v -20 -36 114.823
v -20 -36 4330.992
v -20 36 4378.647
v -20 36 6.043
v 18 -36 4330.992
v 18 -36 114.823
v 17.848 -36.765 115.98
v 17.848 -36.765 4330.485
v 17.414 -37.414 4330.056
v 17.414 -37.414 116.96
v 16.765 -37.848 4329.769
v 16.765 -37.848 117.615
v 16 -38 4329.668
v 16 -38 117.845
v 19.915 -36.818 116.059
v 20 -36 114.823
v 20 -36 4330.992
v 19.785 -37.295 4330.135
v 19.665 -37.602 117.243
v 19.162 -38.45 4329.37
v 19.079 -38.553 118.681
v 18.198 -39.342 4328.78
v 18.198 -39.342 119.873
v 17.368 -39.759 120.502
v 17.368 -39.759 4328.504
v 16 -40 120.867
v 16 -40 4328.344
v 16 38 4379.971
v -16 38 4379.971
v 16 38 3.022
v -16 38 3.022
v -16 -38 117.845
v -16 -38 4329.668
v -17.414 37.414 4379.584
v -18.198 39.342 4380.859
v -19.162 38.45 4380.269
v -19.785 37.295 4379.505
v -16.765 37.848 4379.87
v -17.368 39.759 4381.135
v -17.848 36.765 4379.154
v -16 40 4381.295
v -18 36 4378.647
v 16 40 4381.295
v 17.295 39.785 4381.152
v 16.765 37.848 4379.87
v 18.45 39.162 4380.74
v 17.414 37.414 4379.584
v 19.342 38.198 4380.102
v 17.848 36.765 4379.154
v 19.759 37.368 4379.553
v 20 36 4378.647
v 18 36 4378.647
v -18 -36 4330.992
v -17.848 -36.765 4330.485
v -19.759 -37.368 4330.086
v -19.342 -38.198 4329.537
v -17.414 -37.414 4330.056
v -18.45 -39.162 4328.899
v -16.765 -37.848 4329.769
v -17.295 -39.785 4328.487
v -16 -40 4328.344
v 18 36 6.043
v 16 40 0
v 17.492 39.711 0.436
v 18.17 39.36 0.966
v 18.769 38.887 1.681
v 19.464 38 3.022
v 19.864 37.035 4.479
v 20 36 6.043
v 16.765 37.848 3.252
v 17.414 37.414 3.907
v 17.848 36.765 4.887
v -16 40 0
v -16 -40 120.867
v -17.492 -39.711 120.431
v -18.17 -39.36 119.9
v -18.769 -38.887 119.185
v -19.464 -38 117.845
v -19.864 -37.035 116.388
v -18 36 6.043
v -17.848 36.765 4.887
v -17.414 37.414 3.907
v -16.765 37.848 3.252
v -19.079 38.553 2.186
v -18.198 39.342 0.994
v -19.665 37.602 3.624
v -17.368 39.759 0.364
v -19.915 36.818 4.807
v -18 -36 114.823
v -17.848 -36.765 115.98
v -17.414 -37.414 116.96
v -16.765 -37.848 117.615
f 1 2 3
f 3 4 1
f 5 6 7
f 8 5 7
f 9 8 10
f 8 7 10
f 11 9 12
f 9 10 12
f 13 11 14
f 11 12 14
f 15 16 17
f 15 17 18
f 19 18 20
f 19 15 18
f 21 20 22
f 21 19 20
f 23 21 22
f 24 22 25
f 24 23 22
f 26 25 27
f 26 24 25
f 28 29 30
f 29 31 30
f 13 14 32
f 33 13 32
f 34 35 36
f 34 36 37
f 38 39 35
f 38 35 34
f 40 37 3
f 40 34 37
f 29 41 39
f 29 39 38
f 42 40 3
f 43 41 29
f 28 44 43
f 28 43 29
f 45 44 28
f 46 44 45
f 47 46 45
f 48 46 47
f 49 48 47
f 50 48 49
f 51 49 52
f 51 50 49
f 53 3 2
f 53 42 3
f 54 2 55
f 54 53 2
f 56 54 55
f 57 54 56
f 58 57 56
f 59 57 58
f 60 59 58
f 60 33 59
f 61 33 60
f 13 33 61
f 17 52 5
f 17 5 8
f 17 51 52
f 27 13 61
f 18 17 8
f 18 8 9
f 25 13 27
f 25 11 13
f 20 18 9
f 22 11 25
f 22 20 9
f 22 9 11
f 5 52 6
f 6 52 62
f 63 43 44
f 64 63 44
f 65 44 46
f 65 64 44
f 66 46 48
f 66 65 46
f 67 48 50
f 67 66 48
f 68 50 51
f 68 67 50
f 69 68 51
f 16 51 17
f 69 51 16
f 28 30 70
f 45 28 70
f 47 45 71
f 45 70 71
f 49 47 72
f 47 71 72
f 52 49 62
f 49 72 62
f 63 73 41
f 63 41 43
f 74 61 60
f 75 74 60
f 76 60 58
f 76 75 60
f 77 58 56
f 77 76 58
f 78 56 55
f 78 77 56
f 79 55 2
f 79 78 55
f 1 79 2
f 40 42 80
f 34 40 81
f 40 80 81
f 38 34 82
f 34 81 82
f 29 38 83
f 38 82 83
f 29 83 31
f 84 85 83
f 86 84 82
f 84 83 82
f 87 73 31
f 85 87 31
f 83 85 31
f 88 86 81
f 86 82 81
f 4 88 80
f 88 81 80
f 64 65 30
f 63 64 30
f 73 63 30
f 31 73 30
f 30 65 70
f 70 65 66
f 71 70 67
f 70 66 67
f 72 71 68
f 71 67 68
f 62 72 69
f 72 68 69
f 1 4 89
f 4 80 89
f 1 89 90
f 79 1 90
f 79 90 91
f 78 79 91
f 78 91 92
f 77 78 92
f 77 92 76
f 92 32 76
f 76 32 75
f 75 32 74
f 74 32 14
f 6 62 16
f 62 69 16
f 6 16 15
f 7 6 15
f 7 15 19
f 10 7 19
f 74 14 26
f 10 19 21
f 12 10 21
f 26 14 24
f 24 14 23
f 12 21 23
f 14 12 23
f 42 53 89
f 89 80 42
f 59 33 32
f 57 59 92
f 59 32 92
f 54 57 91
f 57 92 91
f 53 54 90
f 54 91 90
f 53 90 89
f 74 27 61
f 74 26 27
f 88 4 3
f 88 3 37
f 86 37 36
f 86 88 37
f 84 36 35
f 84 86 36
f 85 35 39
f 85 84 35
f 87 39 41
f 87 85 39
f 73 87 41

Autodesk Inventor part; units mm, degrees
ref_plane "YZ Plane" through (0, 0, 0) normal (1, 0, 0) x (0, 1, 0)
ref_plane "Start plane" through (0, 0, 0) normal (0, 0, 1) x (1, 0, 0)
ref_plane "End plane" through (0, 0, 4381.295) normal (0, 0, 1) x (1, 0, 0)
sketch "Sketch" plane through (0, 0, 0) normal (0, 0, 1) x (1, 0, 0)
  line L0 (-20, -36) -> (-20, 36)
  line L1 (-16, 40) -> (16, 40)
  line L2 (20, 36) -> (20, -36)
  line L3 (16, -40) -> (-16, -40)
  arc A0 (-20, -36) -> (-16, -40) centre (-16, -36) ccw
  arc A1 (20, 36) -> (16, 40) centre (16, 36) ccw
  arc A2 (-16, 40) -> (-20, 36) centre (-16, 36) ccw
  arc A3 (16, -40) -> (20, -36) centre (16, -36) ccw
  arc A4 (-16, 38) -> (-18, 36) centre (-16, 36) ccw
  line L4 (-16, 38) -> (16, 38)
  arc A5 (18, 36) -> (16, 38) centre (16, 36) ccw
  line L5 (18, 36) -> (18, -36)
  arc A6 (16, -38) -> (18, -36) centre (16, -36) ccw
  line L6 (16, -38) -> (-16, -38)
  arc A7 (-18, -36) -> (-16, -38) centre (-16, -36) ccw
  line L7 (-18, -36) -> (-18, 36)
  line L8 (0, 37.1021) -> (0, -37.1021) construction
  line L9 (-23.1021, 0) -> (23.1021, 0) construction
  dimension "d7" = 4
  dimension "d9" = 40
  dimension "d11" = 80
  dimension "d12" = 2
  dimension "d15" = 20
  dimension "d16" = 40
extrude "Body" add sketch "Sketch" along normal up to surface (4381.295 mm away) from surface at 0
sketch "Sketch3" plane through (0, 0, 0) normal (0, 0, 1) x (1, 0, 0)
  line L0 (0, 0) -> (10, 0)
ref_plane "Work Plane3" through (0, 0, 0) normal (0, -1, 0) x (1, 0, 0)
sketch "Sketch5" plane through (20, -36, 4381.295) normal (1, 0, 0) x (0, 0, -1)
  line L0 (4381.295, 76) -> (0, 76) projected
  line L1 (4381.295, 72) -> (4381.295, 76) projected
  line L2 (4381.295, 72) -> (4381.295, 0) projected
  line L3 (4381.295, -4) -> (4381.295, 0) projected
  line L4 (4381.295, -4) -> (0, -4) projected
  line L5 (4381.295, 76) -> (4260.4282, -4)
  line L6 (0, 72) -> (0, 76) projected
  line L7 (0, 72) -> (0, 0) projected
  line L8 (0, -4) -> (0, 0) projected
  line L9 (0, 76) -> (52.9508, -4)
  point P0 (4381.295, 36)
  dimension "d19" = 56.5
  dimension "d20" = 33.5
extrude "Extrusion2" cut sketch "Sketch5" against normal through all contours L1 L2 L3 L4 L5 | L9 L4 L8 L7 L6
sketch "Sketch4" plane through (0, 0, 0) normal (0, -1, 0) x (1, 0, 0)
  line L0 (-2, 0) -> (12, 0) projected
  line L1 (-2, 4381.295) -> (12, 4381.295) projected
  dimension "d18" = 4381.295
equation "\"d7\" = G_IR"
equation "\"d9\" = G_W"
equation "\"d11\" = G_H"
equation "\"d12\" = G_T"
equation "\"d15\" = 0.5 * d9"
equation "\"d16\" = 0.5 * d11"
equation "\"d3\" = G_L"
equation "\"G_W\" = 40"
equation "\"G_H\" = 80"
equation "\"G_T\" = 2"
equation "\"G_IR\" = 4"
equation "\"G_L\" = d18"
equation "\"G_OFFSET_START\" = 0"
equation "\"G_OFFSET_END\" = 0"
equation "\"d14\" = G_OFFSET_END + B_L"
equation "\"B_L\" = 4381.295"
properties part number "ISO 4019 - 80x40x2 - 4381,295" material "Steel, Mild"
